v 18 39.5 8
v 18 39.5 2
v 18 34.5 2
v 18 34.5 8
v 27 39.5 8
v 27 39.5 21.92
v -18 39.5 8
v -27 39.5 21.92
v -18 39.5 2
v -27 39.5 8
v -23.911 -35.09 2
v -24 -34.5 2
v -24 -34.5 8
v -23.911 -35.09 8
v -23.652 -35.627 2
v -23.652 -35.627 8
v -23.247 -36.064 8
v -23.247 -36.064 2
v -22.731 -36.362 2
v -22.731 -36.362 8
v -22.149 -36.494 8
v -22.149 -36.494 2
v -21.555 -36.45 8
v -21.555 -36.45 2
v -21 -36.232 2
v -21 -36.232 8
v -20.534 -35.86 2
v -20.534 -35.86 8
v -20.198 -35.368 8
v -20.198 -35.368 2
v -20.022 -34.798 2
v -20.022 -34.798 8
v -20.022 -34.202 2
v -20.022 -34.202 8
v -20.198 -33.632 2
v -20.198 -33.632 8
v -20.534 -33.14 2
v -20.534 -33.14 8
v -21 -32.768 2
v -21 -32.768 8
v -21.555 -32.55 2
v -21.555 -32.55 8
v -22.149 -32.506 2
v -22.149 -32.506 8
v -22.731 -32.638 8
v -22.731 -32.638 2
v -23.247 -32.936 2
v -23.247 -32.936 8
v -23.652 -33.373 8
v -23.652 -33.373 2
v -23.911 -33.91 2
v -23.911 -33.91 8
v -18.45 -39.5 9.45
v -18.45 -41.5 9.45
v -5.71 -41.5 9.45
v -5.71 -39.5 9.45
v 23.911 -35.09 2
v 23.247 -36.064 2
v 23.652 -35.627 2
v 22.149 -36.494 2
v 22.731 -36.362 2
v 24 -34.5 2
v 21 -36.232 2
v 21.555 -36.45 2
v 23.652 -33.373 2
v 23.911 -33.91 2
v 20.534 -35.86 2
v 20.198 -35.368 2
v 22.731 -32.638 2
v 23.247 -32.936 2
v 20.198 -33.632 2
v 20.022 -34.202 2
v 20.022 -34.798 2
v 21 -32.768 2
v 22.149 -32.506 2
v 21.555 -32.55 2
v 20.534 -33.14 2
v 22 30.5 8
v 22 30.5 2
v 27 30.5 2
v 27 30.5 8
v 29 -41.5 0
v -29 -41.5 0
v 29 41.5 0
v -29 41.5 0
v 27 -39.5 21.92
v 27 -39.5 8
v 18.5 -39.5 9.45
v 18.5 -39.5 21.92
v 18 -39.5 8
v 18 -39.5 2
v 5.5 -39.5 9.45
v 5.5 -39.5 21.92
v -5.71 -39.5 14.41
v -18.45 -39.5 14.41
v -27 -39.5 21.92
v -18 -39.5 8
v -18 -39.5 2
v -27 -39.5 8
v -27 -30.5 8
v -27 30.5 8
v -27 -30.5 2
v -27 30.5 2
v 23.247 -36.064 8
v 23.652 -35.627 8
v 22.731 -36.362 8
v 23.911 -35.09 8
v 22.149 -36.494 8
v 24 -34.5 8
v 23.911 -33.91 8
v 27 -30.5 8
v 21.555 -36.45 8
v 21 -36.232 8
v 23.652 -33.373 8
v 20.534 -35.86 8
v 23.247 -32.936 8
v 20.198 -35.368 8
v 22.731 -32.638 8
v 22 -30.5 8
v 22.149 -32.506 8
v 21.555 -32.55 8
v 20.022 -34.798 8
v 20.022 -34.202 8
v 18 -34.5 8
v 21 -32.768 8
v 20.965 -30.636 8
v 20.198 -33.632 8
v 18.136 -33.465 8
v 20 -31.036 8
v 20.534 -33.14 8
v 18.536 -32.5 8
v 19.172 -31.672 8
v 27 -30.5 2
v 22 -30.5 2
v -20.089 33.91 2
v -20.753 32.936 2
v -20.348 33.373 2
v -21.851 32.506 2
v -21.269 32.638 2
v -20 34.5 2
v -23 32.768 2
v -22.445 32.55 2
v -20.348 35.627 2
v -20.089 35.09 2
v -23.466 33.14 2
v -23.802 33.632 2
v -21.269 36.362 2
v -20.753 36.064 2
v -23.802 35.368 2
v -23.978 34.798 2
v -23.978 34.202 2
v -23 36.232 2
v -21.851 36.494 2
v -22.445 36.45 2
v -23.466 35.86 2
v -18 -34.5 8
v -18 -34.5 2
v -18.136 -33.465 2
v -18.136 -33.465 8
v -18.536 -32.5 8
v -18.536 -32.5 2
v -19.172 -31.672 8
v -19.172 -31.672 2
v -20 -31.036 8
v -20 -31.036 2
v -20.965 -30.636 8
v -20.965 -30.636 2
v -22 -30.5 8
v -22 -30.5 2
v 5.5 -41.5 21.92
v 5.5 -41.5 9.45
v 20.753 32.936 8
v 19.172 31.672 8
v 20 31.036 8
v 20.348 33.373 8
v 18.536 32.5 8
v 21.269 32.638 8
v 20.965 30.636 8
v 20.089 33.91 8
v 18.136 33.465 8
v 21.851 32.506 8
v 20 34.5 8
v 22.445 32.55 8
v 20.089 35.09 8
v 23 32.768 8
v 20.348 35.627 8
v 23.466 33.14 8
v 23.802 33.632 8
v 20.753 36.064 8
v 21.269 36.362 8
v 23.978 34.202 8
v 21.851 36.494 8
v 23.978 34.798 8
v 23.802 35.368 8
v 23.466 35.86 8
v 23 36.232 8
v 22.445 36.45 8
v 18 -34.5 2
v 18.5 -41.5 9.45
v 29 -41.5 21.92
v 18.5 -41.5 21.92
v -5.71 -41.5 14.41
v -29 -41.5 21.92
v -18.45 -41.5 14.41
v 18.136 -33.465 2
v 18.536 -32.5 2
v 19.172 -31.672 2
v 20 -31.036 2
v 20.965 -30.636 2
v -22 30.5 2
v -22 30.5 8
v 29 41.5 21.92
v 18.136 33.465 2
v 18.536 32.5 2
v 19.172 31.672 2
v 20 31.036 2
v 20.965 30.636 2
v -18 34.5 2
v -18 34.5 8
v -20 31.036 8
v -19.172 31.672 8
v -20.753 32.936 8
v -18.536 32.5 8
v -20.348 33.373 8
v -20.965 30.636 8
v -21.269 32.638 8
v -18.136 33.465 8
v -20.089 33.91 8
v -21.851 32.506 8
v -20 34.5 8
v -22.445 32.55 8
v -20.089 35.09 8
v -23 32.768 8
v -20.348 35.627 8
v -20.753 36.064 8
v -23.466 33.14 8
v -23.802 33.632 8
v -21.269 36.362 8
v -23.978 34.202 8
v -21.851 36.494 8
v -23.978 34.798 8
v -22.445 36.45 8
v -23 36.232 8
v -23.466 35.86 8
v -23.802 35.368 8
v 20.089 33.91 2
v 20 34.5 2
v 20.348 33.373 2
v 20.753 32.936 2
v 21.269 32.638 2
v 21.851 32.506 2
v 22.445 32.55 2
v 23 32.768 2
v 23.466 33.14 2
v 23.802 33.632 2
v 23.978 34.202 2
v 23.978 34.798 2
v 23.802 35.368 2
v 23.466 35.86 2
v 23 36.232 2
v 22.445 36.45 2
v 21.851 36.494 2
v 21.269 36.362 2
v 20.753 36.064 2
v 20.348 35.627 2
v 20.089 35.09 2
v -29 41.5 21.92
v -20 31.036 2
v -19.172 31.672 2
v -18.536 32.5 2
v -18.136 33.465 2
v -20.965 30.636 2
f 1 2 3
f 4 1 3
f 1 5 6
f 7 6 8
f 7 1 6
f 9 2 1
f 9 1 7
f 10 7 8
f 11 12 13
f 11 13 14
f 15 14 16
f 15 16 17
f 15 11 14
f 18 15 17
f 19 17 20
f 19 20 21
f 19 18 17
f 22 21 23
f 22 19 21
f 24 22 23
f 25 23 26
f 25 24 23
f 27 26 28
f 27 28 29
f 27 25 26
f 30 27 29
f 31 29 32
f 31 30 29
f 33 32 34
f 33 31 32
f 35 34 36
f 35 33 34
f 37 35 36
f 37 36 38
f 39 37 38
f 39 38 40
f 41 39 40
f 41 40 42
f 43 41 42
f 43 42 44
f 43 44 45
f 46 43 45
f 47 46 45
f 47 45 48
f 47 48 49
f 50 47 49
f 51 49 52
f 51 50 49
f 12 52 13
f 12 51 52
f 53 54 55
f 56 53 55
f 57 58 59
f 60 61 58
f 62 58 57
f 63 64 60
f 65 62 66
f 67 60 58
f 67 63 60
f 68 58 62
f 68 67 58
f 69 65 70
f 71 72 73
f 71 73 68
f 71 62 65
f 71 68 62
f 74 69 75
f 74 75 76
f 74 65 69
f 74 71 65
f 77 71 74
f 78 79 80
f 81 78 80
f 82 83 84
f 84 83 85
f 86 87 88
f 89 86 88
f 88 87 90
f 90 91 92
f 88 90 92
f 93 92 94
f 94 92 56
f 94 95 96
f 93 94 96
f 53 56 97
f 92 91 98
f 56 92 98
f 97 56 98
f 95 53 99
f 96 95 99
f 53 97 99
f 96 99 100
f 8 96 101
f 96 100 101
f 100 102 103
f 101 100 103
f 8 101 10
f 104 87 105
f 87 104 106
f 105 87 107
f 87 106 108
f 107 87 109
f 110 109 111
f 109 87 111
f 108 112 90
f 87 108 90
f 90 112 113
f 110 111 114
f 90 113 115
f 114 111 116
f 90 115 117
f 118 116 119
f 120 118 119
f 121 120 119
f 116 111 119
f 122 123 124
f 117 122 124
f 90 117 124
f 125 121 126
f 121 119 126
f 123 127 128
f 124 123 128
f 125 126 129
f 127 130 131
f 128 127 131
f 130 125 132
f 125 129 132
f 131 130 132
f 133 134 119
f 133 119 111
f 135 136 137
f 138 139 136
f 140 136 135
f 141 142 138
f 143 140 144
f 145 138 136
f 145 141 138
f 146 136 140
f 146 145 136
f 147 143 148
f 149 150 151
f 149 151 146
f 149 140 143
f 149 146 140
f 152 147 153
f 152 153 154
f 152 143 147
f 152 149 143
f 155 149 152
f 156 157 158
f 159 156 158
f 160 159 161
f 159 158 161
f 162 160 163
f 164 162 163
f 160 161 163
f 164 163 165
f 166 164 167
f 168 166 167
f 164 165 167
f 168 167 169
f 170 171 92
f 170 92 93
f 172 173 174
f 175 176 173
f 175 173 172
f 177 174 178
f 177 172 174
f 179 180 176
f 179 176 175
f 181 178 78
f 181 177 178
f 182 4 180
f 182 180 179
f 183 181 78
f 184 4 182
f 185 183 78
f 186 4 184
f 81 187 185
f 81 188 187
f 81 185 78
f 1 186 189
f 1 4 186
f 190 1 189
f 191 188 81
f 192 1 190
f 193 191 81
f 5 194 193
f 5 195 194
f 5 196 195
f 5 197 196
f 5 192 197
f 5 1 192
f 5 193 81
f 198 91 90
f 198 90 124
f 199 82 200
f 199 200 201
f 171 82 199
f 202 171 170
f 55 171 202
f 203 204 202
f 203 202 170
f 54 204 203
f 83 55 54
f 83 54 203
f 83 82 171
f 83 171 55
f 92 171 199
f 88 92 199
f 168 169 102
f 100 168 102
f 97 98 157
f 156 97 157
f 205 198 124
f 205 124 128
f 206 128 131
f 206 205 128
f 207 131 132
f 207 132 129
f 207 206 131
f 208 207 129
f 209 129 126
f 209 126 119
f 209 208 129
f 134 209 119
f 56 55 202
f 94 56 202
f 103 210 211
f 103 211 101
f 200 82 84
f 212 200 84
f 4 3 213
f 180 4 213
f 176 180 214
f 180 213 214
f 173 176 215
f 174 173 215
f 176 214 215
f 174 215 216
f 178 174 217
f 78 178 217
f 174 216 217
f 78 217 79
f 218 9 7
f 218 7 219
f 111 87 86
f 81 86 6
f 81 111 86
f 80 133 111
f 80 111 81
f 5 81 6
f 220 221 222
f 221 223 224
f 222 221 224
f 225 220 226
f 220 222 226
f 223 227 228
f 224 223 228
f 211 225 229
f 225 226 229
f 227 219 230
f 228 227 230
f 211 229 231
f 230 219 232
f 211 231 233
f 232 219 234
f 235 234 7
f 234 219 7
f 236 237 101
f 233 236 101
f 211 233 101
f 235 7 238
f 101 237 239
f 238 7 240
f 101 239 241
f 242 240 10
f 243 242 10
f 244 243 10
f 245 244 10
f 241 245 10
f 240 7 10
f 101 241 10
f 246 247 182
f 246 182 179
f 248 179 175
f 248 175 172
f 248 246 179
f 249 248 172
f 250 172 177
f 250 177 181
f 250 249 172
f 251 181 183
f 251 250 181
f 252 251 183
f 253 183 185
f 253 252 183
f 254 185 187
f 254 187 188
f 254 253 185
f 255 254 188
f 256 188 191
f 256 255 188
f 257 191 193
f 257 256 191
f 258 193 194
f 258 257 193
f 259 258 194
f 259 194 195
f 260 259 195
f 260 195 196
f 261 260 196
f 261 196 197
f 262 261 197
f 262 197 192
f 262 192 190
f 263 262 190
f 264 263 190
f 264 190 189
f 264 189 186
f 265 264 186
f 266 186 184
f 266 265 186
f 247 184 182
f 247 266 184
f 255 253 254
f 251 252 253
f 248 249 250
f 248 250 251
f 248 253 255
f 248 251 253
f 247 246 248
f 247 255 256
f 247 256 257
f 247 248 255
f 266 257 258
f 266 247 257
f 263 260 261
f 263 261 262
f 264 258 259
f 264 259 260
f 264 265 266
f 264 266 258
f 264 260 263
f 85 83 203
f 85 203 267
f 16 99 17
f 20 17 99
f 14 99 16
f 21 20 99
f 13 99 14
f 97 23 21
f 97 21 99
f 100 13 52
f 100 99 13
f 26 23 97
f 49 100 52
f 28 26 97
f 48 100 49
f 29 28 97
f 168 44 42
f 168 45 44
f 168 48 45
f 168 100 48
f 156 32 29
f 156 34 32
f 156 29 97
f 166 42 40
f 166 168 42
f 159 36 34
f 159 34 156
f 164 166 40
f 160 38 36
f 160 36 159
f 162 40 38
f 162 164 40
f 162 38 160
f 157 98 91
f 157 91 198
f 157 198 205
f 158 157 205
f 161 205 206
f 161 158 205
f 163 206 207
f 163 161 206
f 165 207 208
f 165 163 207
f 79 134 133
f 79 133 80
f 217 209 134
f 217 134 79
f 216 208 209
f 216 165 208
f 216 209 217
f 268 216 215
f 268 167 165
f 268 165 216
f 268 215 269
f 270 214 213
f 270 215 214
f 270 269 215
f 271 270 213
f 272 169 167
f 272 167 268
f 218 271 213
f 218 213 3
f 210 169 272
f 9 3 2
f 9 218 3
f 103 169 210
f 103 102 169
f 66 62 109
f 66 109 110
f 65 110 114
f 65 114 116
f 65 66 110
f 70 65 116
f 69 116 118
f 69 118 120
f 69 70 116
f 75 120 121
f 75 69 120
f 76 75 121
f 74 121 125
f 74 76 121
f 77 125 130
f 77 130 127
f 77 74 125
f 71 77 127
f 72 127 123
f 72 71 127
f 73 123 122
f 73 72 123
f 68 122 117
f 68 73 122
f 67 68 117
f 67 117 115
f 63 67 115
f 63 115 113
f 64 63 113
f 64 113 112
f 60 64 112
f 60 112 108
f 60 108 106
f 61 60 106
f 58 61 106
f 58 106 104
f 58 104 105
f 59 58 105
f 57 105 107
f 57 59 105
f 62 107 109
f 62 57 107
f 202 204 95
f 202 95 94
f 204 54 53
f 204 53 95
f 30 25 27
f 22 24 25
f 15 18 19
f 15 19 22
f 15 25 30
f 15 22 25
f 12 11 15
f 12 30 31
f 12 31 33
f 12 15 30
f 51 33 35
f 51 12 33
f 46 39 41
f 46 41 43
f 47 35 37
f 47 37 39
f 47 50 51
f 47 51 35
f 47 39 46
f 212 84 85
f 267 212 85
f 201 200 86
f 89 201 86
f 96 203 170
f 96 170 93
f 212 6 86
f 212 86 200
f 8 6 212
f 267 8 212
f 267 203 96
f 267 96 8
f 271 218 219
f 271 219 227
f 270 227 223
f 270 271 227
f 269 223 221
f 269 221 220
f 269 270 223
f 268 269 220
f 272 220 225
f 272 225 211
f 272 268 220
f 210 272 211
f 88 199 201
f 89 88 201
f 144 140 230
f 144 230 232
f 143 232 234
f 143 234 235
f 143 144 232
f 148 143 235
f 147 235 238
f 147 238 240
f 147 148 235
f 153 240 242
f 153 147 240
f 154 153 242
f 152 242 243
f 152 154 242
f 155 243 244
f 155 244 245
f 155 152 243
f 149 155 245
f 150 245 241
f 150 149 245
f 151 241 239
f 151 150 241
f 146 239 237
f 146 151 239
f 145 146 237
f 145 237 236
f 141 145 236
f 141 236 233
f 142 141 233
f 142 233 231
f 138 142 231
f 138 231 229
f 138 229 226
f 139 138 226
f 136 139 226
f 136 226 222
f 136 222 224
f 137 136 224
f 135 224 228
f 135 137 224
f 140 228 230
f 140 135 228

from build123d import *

# Parameters (mm, degrees)
SKETCH1_W           = 83
SKETCH1_H           = 58
BOSS_EXTRUDE1_DEPTH = 21.92
SHELL1_T            = -2
SKETCH2_R           = 2
BOSS_EXTRUDE2_DEPTH = 6
SKETCH3_W           = 12.74
SKETCH3_H           = 4.96
SKETCH3_W_2         = 13
SKETCH3_H_2         = 13
CUT_EXTRUDE1_DEPTH  = 2


with BuildPart() as part:
    # Sketch1 → Boss-Extrude1 (new body)
    with BuildSketch(Plane(origin=(0, 0, 0), x_dir=(0, 1, 0), z_dir=(0, 0, 1))):
        Rectangle(SKETCH1_W, SKETCH1_H)
    extrude(amount=BOSS_EXTRUDE1_DEPTH)

    # Shell1
    shell1_openings = [part.faces().sort_by_distance(p)[0] for p in [
        (0, 0, 21.92),
    ]]
    offset(amount=SHELL1_T, openings=shell1_openings, kind=Kind.INTERSECTION)

    # Sketch2 → Boss-Extrude2 (add)
    # profile 1 of 4: a face of its own
    with BuildSketch(Plane.XY.offset(2)):
        with BuildLine():
            Line((-27, 39.5), (-18, 39.5))
            Line((-18, 39.5), (-18, 34.5))
            ThreePointArc((-18, 34.5), (-19.171572875, 31.671572875), (-22, 30.5))
            Line((-22, 30.5), (-27, 30.5))
            Line((-27, 30.5), (-27, 39.5))
        make_face()
        with Locations((-22, 34.5)):
            Circle(SKETCH2_R, mode=Mode.SUBTRACT)
    # profile 2 of 4: a face of its own
    with BuildSketch(Plane.XY.offset(2)):
        with BuildLine():
            Line((18, 39.5), (18, 34.5))
            ThreePointArc((18, 34.5), (19.171572875, 31.671572875), (22, 30.5))
            Line((22, 30.5), (27, 30.5))
            Line((27, 30.5), (27, 39.5))
            Line((27, 39.5), (18, 39.5))
        make_face()
        with Locations(Location((22, 34.5, 0), (0, 0, 180))):
            Circle(SKETCH2_R, mode=Mode.SUBTRACT)
    # profile 3 of 4: a face of its own
    with BuildSketch(Plane.XY.offset(2)):
        with BuildLine():
            Line((27, -39.5), (18, -39.5))
            Line((18, -39.5), (18, -34.5))
            ThreePointArc((18, -34.5), (19.171572875, -31.671572875), (22, -30.5))
            Line((22, -30.5), (27, -30.5))
            Line((27, -30.5), (27, -39.5))
        make_face()
        with Locations((22, -34.5)):
            Circle(SKETCH2_R, mode=Mode.SUBTRACT)
    # profile 4 of 4: a face of its own
    with BuildSketch(Plane.XY.offset(2)):
        with BuildLine():
            Line((-18, -39.5), (-18, -34.5))
            ThreePointArc((-18, -34.5), (-19.171572875, -31.671572875), (-22, -30.5))
            Line((-22, -30.5), (-27, -30.5))
            Line((-27, -30.5), (-27, -39.5))
            Line((-27, -39.5), (-18, -39.5))
        make_face()
        with Locations(Location((-22, -34.5, 0), (0, 0, 180))):
            Circle(SKETCH2_R, mode=Mode.SUBTRACT)
    extrude(amount=BOSS_EXTRUDE2_DEPTH)

    # Sketch3 → Cut-Extrude1 (cut)
    with BuildSketch(Plane.XZ.offset(41.5)):
        with Locations((-12.08, 11.93)):
            Rectangle(SKETCH3_W, SKETCH3_H)
        with Locations((12, 15.95)):
            Rectangle(SKETCH3_W_2, SKETCH3_H_2)
    extrude(amount=-CUT_EXTRUDE1_DEPTH, mode=Mode.SUBTRACT)


solid = part.part
